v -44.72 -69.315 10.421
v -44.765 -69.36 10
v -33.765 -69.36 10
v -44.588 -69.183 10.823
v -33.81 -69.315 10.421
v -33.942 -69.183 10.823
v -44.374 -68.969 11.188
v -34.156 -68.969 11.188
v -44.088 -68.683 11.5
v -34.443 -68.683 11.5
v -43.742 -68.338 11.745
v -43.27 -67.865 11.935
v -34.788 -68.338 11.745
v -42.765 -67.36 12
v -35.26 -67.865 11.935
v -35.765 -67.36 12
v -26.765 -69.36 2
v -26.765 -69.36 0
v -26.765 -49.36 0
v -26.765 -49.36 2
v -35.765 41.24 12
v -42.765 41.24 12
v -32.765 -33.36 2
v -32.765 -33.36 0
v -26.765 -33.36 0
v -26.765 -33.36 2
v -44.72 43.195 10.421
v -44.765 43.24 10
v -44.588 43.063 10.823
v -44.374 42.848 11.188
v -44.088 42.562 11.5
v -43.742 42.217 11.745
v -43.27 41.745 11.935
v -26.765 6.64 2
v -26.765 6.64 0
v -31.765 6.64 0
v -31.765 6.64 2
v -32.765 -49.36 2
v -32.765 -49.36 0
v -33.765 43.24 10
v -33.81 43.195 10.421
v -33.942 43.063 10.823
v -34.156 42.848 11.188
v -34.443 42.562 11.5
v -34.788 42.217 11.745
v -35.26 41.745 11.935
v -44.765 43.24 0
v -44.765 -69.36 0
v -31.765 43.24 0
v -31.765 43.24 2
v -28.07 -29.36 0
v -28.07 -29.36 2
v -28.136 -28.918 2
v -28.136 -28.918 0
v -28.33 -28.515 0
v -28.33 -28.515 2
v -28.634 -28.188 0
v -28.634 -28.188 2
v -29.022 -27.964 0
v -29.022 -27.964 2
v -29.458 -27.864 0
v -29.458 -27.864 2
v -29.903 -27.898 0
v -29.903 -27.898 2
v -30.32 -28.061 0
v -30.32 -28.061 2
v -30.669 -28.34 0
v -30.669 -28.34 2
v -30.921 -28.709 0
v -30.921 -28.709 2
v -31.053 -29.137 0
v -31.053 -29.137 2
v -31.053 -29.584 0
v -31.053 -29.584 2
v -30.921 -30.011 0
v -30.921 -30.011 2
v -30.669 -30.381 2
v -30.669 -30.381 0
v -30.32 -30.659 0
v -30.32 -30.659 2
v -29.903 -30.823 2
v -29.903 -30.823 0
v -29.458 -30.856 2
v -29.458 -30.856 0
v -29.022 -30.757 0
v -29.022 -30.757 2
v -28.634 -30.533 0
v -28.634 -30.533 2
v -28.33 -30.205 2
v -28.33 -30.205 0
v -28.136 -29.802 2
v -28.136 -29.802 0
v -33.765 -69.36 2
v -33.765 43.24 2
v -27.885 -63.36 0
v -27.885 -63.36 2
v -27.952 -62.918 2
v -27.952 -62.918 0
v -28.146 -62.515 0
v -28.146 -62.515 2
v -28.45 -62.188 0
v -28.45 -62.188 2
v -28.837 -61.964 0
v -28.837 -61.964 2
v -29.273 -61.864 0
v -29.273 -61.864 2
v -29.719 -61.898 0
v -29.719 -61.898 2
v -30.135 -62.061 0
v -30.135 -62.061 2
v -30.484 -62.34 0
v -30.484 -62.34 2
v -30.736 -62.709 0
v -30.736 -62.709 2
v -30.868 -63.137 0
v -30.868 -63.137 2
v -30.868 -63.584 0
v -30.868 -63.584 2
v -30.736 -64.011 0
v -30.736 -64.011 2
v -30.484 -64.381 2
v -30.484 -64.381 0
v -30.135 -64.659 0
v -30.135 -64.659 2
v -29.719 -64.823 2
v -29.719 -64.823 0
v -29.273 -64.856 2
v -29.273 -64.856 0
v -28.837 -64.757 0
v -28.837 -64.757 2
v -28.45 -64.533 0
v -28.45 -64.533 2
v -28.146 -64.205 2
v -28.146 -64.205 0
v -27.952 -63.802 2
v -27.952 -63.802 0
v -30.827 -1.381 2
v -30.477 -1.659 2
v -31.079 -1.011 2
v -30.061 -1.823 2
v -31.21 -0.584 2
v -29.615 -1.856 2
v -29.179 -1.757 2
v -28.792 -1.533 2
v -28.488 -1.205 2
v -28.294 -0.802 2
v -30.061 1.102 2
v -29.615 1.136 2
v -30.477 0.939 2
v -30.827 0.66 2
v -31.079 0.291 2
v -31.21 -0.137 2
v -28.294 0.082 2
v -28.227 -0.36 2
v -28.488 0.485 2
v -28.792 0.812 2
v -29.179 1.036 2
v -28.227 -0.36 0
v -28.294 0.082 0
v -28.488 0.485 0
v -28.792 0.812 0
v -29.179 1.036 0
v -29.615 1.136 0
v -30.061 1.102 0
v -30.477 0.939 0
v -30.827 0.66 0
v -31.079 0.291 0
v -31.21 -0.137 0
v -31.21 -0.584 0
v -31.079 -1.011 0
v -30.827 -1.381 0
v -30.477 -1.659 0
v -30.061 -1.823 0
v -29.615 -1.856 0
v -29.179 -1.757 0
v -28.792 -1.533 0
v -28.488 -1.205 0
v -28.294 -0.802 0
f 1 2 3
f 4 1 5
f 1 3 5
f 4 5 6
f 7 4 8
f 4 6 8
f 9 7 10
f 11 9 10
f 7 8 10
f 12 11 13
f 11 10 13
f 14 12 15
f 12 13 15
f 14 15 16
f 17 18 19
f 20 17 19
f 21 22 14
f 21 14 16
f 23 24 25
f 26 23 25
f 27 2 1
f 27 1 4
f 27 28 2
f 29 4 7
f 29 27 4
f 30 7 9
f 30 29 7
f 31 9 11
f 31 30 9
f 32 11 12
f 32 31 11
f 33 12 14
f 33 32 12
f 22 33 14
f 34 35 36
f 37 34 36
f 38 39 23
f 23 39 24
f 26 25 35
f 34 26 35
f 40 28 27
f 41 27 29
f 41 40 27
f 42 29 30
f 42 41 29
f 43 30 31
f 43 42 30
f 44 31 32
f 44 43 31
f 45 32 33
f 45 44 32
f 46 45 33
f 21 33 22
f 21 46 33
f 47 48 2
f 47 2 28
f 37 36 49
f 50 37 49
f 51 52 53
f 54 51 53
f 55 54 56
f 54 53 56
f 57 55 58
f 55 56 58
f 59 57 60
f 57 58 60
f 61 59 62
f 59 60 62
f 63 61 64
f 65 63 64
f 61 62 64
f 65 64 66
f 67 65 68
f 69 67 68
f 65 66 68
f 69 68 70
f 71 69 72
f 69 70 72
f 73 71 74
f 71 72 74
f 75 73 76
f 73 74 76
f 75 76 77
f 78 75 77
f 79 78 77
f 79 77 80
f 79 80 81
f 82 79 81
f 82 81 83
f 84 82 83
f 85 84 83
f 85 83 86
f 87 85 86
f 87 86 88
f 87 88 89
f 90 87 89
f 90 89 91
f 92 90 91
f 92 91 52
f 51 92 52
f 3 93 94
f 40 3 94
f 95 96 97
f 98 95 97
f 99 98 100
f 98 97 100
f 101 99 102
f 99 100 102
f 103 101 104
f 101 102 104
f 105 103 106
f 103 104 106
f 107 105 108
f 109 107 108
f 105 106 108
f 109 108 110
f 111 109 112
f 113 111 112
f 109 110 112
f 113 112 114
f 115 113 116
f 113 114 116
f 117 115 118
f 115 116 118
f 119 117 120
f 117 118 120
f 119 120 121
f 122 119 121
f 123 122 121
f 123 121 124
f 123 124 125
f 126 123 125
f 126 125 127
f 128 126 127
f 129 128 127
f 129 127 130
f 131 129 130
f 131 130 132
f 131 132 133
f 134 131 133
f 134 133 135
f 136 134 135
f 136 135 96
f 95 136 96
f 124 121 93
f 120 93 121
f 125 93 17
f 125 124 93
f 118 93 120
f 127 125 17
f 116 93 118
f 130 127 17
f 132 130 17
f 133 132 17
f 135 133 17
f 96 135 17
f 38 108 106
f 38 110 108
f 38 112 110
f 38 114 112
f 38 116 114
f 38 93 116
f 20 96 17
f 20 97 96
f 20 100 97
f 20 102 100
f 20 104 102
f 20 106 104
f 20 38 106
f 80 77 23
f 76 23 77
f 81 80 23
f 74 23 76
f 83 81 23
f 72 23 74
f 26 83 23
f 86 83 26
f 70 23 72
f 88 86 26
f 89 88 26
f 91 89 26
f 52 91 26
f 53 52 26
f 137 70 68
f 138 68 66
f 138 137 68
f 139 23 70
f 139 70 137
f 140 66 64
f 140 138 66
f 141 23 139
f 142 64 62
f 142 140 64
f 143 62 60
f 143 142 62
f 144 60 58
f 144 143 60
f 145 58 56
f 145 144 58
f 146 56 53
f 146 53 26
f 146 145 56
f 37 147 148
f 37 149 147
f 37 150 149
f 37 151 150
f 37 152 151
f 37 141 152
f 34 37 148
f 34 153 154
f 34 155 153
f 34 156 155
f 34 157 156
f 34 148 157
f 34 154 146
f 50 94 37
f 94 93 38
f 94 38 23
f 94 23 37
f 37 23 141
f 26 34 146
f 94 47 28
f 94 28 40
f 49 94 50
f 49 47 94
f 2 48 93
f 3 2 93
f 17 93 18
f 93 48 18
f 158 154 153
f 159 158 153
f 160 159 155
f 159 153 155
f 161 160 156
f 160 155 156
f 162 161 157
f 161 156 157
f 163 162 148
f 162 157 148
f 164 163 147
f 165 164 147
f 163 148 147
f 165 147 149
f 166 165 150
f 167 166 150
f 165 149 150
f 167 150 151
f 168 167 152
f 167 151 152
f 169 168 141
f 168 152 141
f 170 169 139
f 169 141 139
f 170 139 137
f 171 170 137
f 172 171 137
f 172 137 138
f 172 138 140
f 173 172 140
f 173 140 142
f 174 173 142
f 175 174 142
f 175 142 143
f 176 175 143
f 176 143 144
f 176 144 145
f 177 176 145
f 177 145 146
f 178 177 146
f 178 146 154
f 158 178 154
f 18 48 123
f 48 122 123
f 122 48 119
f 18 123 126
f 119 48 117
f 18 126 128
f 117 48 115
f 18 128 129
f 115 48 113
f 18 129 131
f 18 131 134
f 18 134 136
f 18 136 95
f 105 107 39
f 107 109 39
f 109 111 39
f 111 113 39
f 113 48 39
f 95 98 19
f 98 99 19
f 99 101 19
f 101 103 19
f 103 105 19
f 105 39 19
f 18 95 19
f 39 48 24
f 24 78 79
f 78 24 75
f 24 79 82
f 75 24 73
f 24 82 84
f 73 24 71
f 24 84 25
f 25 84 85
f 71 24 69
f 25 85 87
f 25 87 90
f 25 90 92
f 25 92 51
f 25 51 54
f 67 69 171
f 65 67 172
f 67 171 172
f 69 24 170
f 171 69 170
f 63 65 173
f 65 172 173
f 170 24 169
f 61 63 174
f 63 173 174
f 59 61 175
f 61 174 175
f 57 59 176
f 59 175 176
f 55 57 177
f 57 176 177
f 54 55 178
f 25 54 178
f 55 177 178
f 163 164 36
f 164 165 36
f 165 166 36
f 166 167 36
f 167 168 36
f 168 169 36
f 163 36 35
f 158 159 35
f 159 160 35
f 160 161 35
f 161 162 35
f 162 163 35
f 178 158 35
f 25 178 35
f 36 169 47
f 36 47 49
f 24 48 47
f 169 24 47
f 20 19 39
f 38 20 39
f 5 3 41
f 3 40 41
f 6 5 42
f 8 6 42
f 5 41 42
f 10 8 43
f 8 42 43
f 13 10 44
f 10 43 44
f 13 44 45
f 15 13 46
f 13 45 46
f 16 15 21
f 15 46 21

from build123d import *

# Parameters (mm, degrees)
F0_W     = 11
F0_H     = 112.6
F1_DEPTH = 2
F3_W     = 11
F3_H     = 112.6
F4_DEPTH = 10
F5_R     = 2
F6_R     = 1.5
F7_DEPTH = 25


with BuildPart() as f1:
    # F0 (on Top) → F1 (new body)
    with BuildSketch(Plane.XY):
        Polygon((-31.7652441872, 6.6397131595), (-31.7652441872, 43.2397131595), (-33.7652441872, 43.2397131595), (-33.7652441872, -69.3602868405), (-26.7652441872, -69.3602868405), (-26.7652441872, -49.3602868405), (-32.7652441872, -49.3602868405), (-32.7652441872, -33.3602868405), (-26.7652441872, -33.3602868405), (-26.7652441872, 6.6397131595), align=None)
        with Locations((-39.2652441872, -13.0602868405)):
            Rectangle(F0_W, F0_H)
    extrude(amount=F1_DEPTH)

    # F3 (on offset) → F4 (join)
    with BuildSketch(Plane.XY.offset(2)):
        with Locations((-39.2652441872, -13.0602868405)):
            Rectangle(F3_W, F3_H)
    extrude(amount=F4_DEPTH)

    # F5
    f5_edges = [f1.edges().sort_by_distance(p)[0] for p in [
        (-39.265244, 43.239713, 12),
        (-44.765244, -13.060287, 12),
        (-33.765244, -13.060287, 12),
        (-39.265244, -69.360287, 12),
    ]]
    fillet(f5_edges, radius=F5_R)

    # F6 (on face) → F7 (cut)
    with BuildSketch(Plane.XY.offset(2)):
        with Locations((-29.7272081302, -0.3602868405)):
            Circle(F6_R)
        with Locations((-29.5696301797, -29.3602868405)):
            Circle(F6_R)
        with Locations((-29.3848836171, -63.3602868405)):
            Circle(F6_R)
    extrude(amount=-F7_DEPTH, mode=Mode.SUBTRACT)


solid = f1.part
